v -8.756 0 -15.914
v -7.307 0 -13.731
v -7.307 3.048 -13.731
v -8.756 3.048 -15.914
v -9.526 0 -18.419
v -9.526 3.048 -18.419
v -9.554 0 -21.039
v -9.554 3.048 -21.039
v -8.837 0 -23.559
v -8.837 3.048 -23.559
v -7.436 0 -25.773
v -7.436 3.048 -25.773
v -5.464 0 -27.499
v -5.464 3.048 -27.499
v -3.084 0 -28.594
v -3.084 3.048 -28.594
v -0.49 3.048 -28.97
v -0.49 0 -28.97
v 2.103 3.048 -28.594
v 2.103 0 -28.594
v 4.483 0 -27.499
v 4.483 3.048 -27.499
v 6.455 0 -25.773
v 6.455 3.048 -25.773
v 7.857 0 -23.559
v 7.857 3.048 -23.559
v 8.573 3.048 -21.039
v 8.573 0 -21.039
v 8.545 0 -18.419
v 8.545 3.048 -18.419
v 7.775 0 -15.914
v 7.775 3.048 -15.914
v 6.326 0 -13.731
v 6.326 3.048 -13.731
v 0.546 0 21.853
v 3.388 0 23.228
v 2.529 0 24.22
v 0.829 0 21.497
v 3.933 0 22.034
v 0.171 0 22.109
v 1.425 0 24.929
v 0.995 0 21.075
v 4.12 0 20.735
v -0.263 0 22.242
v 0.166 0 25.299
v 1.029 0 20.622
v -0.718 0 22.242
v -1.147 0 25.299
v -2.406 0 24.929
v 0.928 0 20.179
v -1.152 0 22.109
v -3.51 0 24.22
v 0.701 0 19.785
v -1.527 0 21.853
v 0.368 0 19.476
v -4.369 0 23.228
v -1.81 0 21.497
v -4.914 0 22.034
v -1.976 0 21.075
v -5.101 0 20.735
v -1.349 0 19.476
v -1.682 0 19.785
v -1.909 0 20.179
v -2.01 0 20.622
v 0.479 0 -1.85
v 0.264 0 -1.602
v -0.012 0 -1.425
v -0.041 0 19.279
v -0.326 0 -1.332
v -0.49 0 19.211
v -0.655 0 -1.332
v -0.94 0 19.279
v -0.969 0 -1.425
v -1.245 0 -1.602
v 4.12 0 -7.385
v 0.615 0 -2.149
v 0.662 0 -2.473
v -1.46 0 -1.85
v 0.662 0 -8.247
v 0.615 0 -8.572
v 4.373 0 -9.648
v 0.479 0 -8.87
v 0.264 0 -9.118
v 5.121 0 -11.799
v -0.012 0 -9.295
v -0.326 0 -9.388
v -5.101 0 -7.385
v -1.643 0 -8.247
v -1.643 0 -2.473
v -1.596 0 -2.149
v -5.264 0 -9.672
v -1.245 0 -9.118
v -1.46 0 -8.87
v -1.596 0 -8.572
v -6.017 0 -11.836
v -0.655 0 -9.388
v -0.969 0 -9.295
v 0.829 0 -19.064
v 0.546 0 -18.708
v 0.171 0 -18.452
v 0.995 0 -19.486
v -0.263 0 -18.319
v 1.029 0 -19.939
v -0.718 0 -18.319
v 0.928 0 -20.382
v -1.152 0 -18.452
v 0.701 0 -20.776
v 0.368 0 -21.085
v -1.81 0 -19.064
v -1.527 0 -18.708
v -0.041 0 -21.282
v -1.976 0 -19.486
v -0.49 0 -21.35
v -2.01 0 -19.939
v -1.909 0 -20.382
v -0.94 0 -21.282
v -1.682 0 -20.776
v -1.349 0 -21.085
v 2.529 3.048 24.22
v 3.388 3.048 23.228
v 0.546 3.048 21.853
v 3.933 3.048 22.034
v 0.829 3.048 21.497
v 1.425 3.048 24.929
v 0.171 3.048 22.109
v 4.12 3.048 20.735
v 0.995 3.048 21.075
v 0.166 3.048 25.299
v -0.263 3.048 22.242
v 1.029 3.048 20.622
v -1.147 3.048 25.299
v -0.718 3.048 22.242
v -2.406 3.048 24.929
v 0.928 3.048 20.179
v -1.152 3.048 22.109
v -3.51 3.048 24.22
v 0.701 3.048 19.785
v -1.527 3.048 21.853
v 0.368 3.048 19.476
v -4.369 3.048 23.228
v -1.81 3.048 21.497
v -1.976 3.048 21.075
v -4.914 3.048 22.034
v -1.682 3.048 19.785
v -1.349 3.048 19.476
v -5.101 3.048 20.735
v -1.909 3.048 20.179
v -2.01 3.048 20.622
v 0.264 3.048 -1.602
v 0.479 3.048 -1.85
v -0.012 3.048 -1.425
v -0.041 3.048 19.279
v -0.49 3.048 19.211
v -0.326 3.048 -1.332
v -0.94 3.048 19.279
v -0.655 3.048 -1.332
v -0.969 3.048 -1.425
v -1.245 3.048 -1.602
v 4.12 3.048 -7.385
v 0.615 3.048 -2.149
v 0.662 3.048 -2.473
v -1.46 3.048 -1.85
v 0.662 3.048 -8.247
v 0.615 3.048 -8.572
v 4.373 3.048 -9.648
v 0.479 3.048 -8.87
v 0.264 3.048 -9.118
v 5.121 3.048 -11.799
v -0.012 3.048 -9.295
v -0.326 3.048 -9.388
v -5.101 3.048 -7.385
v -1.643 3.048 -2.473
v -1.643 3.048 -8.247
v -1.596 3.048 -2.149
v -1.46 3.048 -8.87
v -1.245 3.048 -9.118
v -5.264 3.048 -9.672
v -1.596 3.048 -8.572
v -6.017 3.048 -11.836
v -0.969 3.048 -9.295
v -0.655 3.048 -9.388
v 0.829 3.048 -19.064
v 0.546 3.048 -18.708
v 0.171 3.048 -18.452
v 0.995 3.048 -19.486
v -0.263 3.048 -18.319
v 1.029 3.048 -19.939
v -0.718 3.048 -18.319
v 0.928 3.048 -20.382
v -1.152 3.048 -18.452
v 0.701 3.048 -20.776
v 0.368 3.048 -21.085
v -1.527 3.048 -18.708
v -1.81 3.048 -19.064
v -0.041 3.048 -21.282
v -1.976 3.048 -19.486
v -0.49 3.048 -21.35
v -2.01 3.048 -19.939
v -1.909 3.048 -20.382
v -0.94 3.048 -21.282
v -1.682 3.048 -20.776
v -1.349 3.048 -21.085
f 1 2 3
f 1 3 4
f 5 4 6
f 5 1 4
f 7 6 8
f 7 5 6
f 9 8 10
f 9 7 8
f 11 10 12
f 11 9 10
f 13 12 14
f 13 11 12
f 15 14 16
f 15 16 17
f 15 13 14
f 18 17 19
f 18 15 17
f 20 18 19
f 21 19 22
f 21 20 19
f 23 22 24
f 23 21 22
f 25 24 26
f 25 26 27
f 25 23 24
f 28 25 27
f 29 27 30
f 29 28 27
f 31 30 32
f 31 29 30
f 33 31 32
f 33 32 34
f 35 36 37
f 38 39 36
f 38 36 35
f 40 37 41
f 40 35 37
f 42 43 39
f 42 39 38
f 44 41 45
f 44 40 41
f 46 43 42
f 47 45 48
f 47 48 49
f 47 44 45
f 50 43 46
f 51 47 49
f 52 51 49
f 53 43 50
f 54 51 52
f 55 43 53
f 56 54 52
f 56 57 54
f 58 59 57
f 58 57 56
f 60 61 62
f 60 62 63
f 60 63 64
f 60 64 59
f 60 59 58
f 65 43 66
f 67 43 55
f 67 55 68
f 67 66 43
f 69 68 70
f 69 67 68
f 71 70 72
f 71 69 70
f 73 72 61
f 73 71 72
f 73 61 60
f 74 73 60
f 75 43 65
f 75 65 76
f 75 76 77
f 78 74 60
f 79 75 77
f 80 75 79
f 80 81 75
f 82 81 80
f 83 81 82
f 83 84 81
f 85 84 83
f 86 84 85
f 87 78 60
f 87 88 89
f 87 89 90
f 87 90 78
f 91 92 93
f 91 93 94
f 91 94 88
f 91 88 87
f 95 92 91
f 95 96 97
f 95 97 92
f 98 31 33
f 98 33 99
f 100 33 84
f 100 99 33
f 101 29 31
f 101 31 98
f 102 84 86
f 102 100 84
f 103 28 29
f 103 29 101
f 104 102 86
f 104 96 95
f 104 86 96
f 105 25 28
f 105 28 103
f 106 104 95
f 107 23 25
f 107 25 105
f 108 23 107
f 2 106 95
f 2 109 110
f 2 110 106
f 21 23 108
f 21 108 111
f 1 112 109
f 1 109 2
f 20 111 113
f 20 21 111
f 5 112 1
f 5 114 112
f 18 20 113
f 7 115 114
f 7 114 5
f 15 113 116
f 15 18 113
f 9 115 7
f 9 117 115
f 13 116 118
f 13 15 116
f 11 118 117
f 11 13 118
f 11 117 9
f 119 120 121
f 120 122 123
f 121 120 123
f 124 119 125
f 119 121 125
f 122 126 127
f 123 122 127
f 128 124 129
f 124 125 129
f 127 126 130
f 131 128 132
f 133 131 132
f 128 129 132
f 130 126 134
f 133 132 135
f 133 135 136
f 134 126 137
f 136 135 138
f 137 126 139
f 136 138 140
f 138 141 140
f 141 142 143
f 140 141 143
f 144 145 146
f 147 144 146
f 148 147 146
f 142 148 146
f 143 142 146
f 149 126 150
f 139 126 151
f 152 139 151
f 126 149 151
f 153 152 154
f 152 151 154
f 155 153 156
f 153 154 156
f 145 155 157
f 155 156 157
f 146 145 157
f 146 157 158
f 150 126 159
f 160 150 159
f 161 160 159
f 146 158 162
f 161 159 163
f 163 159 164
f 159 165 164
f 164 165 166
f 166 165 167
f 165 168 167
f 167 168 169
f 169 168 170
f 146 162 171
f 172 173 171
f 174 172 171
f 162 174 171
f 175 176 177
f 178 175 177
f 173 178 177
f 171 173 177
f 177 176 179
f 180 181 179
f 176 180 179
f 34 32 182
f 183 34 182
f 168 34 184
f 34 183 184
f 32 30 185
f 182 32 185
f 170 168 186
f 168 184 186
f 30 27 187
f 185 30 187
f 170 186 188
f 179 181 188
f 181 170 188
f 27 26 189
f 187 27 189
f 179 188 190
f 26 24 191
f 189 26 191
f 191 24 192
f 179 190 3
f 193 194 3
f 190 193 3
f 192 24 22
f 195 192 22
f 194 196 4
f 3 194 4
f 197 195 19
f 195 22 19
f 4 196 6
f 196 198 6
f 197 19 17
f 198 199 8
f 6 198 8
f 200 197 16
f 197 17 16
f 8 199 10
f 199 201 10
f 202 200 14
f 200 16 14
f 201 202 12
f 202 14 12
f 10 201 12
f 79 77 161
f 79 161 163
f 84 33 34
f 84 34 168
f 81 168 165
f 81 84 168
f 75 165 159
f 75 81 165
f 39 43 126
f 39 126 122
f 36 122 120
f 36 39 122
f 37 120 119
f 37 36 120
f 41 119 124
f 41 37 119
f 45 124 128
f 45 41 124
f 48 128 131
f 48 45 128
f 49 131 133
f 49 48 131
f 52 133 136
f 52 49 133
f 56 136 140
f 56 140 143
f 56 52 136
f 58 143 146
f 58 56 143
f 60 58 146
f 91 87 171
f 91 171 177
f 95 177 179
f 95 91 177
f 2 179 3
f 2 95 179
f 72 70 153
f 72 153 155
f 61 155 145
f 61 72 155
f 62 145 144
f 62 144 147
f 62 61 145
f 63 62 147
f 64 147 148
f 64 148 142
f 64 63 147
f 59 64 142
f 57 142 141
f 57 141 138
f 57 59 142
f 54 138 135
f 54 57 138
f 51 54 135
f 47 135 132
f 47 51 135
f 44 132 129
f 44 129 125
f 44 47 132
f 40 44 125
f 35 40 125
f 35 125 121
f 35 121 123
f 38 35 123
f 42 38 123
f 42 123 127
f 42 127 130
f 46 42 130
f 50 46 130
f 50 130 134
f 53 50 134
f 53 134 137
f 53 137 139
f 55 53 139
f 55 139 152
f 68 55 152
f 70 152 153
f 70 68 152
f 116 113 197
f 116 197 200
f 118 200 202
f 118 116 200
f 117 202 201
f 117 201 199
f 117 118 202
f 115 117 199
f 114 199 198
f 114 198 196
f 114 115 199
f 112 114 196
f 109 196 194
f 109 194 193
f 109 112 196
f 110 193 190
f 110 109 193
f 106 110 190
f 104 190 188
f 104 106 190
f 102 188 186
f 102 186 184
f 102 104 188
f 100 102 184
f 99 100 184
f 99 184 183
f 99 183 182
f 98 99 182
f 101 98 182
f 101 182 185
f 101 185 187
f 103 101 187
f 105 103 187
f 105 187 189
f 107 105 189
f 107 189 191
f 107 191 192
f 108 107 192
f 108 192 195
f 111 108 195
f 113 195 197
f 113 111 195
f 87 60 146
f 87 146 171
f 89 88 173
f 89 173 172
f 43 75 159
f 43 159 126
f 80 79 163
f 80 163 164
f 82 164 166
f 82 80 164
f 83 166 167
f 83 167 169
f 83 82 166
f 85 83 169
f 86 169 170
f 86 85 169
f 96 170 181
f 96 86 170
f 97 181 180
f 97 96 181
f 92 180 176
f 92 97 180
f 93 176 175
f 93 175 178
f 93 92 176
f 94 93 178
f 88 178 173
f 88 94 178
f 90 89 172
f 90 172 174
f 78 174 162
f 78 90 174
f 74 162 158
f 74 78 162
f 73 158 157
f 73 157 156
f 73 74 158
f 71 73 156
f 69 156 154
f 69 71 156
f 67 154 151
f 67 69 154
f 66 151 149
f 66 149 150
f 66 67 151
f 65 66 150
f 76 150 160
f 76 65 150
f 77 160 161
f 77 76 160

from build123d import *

# Parameters (mm, degrees)
SKETCH1_R           = 1.524
BOSS_EXTRUDE1_DEPTH = 3.048


with BuildPart() as part:
    # Sketch1 → Boss-Extrude1 (new body)
    with BuildSketch(Plane(origin=(0, 0, 0), x_dir=(1, 0, 0), z_dir=(0, 1, 0))):
        with BuildLine():
            Line((4.120039677, 7.385454502), (4.120039677, -20.735478746))
            ThreePointArc((4.120039677, -20.735478746), (-0.490464098, -25.345982522), (-5.100967874, -20.735478746))
            Line((-5.100967874, -20.735478746), (-5.100967874, 7.385454502))
            ThreePointArc((-5.100967874, 7.385454502), (-5.569137189, 10.778713446), (-7.306945844, 13.730561993))
            ThreePointArc((-7.306945844, 13.730561993), (-0.490464096, 28.96950355), (6.326017651, 13.730561993))
            ThreePointArc((6.326017651, 13.730561993), (4.687262198, 10.744276018), (4.120039677, 7.385454502))
        make_face()
        with Locations(Location((-0.490464098, -20.735478746, 0), (0, 0, 90))):
            Circle(SKETCH1_R, mode=Mode.SUBTRACT)
        with Locations(Location((-0.490464096, 19.82550355, 0), (0, 0, 90))):
            Circle(SKETCH1_R, mode=Mode.SUBTRACT)
        with BuildLine():
            Line((-1.643126624, 8.246871525), (-1.643126624, 2.47327546))
            ThreePointArc((-1.643126624, 2.47327546), (-0.49050068, 1.320649517), (0.662125264, 2.47327546))
            Line((0.662125264, 2.47327546), (0.662125264, 8.246871525))
            ThreePointArc((0.662125264, 8.246871525), (-0.49050068, 9.399497469), (-1.643126624, 8.246871525))
        make_face(mode=Mode.SUBTRACT)
    extrude(amount=BOSS_EXTRUDE1_DEPTH)


solid = part.part
